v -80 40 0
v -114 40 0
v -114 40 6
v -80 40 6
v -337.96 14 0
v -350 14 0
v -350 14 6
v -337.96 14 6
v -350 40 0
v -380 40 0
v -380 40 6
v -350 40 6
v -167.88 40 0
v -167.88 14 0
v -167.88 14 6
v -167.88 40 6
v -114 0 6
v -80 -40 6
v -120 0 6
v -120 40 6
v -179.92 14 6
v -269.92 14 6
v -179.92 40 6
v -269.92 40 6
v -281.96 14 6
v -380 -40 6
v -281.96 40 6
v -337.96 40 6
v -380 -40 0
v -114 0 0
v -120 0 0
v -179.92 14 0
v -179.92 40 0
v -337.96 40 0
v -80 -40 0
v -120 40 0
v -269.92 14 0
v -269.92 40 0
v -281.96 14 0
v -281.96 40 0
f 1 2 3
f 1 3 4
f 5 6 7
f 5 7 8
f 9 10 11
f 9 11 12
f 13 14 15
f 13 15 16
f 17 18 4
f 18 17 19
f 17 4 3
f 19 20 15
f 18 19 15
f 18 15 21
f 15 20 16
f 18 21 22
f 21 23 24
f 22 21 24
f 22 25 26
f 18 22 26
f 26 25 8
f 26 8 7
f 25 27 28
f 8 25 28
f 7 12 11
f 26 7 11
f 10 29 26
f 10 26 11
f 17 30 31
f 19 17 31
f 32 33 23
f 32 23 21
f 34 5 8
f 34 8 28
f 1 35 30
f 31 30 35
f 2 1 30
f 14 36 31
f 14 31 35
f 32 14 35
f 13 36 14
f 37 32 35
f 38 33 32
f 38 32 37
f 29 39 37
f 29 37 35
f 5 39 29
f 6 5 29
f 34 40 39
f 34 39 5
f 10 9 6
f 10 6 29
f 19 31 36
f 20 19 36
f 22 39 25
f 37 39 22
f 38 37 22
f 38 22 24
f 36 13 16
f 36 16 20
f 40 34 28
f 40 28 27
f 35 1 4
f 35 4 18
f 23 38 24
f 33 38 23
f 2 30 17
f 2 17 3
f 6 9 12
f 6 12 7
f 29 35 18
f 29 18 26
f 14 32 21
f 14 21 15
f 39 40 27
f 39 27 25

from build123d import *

# Parameters (mm, degrees)
BOSS_EXTRUDE1_DEPTH = 6
SKETCH2_W           = 6
SKETCH2_H           = 40
CUT_EXTRUDE1_DEPTH  = 10


with BuildPart() as part:
    # Sketch1 → Boss-Extrude1 (new body)
    with BuildSketch(Plane.XY):
        Polygon((-350, 40), (-350, 14), (-337.96, 14), (-337.96, 40), (-281.96, 40), (-281.96, 14), (-269.92, 14), (-269.92, 40), (-179.92, 40), (-179.92, 14), (-167.88, 14), (-167.88, 40), (-80, 40), (-80, -40), (-380, -40), (-380, 40), align=None)
    extrude(amount=BOSS_EXTRUDE1_DEPTH)

    # Sketch2 → Cut-Extrude1 (cut)
    with BuildSketch(Plane(origin=(0, 0, 0), x_dir=(-1, 0, 0), z_dir=(0, 0, -1))):
        with Locations((57, 20)):
            Rectangle(SKETCH2_W, SKETCH2_H)
        with Locations((117, 20)):
            Rectangle(SKETCH2_W, SKETCH2_H)
    extrude(amount=-CUT_EXTRUDE1_DEPTH, mode=Mode.SUBTRACT)


solid = part.part
